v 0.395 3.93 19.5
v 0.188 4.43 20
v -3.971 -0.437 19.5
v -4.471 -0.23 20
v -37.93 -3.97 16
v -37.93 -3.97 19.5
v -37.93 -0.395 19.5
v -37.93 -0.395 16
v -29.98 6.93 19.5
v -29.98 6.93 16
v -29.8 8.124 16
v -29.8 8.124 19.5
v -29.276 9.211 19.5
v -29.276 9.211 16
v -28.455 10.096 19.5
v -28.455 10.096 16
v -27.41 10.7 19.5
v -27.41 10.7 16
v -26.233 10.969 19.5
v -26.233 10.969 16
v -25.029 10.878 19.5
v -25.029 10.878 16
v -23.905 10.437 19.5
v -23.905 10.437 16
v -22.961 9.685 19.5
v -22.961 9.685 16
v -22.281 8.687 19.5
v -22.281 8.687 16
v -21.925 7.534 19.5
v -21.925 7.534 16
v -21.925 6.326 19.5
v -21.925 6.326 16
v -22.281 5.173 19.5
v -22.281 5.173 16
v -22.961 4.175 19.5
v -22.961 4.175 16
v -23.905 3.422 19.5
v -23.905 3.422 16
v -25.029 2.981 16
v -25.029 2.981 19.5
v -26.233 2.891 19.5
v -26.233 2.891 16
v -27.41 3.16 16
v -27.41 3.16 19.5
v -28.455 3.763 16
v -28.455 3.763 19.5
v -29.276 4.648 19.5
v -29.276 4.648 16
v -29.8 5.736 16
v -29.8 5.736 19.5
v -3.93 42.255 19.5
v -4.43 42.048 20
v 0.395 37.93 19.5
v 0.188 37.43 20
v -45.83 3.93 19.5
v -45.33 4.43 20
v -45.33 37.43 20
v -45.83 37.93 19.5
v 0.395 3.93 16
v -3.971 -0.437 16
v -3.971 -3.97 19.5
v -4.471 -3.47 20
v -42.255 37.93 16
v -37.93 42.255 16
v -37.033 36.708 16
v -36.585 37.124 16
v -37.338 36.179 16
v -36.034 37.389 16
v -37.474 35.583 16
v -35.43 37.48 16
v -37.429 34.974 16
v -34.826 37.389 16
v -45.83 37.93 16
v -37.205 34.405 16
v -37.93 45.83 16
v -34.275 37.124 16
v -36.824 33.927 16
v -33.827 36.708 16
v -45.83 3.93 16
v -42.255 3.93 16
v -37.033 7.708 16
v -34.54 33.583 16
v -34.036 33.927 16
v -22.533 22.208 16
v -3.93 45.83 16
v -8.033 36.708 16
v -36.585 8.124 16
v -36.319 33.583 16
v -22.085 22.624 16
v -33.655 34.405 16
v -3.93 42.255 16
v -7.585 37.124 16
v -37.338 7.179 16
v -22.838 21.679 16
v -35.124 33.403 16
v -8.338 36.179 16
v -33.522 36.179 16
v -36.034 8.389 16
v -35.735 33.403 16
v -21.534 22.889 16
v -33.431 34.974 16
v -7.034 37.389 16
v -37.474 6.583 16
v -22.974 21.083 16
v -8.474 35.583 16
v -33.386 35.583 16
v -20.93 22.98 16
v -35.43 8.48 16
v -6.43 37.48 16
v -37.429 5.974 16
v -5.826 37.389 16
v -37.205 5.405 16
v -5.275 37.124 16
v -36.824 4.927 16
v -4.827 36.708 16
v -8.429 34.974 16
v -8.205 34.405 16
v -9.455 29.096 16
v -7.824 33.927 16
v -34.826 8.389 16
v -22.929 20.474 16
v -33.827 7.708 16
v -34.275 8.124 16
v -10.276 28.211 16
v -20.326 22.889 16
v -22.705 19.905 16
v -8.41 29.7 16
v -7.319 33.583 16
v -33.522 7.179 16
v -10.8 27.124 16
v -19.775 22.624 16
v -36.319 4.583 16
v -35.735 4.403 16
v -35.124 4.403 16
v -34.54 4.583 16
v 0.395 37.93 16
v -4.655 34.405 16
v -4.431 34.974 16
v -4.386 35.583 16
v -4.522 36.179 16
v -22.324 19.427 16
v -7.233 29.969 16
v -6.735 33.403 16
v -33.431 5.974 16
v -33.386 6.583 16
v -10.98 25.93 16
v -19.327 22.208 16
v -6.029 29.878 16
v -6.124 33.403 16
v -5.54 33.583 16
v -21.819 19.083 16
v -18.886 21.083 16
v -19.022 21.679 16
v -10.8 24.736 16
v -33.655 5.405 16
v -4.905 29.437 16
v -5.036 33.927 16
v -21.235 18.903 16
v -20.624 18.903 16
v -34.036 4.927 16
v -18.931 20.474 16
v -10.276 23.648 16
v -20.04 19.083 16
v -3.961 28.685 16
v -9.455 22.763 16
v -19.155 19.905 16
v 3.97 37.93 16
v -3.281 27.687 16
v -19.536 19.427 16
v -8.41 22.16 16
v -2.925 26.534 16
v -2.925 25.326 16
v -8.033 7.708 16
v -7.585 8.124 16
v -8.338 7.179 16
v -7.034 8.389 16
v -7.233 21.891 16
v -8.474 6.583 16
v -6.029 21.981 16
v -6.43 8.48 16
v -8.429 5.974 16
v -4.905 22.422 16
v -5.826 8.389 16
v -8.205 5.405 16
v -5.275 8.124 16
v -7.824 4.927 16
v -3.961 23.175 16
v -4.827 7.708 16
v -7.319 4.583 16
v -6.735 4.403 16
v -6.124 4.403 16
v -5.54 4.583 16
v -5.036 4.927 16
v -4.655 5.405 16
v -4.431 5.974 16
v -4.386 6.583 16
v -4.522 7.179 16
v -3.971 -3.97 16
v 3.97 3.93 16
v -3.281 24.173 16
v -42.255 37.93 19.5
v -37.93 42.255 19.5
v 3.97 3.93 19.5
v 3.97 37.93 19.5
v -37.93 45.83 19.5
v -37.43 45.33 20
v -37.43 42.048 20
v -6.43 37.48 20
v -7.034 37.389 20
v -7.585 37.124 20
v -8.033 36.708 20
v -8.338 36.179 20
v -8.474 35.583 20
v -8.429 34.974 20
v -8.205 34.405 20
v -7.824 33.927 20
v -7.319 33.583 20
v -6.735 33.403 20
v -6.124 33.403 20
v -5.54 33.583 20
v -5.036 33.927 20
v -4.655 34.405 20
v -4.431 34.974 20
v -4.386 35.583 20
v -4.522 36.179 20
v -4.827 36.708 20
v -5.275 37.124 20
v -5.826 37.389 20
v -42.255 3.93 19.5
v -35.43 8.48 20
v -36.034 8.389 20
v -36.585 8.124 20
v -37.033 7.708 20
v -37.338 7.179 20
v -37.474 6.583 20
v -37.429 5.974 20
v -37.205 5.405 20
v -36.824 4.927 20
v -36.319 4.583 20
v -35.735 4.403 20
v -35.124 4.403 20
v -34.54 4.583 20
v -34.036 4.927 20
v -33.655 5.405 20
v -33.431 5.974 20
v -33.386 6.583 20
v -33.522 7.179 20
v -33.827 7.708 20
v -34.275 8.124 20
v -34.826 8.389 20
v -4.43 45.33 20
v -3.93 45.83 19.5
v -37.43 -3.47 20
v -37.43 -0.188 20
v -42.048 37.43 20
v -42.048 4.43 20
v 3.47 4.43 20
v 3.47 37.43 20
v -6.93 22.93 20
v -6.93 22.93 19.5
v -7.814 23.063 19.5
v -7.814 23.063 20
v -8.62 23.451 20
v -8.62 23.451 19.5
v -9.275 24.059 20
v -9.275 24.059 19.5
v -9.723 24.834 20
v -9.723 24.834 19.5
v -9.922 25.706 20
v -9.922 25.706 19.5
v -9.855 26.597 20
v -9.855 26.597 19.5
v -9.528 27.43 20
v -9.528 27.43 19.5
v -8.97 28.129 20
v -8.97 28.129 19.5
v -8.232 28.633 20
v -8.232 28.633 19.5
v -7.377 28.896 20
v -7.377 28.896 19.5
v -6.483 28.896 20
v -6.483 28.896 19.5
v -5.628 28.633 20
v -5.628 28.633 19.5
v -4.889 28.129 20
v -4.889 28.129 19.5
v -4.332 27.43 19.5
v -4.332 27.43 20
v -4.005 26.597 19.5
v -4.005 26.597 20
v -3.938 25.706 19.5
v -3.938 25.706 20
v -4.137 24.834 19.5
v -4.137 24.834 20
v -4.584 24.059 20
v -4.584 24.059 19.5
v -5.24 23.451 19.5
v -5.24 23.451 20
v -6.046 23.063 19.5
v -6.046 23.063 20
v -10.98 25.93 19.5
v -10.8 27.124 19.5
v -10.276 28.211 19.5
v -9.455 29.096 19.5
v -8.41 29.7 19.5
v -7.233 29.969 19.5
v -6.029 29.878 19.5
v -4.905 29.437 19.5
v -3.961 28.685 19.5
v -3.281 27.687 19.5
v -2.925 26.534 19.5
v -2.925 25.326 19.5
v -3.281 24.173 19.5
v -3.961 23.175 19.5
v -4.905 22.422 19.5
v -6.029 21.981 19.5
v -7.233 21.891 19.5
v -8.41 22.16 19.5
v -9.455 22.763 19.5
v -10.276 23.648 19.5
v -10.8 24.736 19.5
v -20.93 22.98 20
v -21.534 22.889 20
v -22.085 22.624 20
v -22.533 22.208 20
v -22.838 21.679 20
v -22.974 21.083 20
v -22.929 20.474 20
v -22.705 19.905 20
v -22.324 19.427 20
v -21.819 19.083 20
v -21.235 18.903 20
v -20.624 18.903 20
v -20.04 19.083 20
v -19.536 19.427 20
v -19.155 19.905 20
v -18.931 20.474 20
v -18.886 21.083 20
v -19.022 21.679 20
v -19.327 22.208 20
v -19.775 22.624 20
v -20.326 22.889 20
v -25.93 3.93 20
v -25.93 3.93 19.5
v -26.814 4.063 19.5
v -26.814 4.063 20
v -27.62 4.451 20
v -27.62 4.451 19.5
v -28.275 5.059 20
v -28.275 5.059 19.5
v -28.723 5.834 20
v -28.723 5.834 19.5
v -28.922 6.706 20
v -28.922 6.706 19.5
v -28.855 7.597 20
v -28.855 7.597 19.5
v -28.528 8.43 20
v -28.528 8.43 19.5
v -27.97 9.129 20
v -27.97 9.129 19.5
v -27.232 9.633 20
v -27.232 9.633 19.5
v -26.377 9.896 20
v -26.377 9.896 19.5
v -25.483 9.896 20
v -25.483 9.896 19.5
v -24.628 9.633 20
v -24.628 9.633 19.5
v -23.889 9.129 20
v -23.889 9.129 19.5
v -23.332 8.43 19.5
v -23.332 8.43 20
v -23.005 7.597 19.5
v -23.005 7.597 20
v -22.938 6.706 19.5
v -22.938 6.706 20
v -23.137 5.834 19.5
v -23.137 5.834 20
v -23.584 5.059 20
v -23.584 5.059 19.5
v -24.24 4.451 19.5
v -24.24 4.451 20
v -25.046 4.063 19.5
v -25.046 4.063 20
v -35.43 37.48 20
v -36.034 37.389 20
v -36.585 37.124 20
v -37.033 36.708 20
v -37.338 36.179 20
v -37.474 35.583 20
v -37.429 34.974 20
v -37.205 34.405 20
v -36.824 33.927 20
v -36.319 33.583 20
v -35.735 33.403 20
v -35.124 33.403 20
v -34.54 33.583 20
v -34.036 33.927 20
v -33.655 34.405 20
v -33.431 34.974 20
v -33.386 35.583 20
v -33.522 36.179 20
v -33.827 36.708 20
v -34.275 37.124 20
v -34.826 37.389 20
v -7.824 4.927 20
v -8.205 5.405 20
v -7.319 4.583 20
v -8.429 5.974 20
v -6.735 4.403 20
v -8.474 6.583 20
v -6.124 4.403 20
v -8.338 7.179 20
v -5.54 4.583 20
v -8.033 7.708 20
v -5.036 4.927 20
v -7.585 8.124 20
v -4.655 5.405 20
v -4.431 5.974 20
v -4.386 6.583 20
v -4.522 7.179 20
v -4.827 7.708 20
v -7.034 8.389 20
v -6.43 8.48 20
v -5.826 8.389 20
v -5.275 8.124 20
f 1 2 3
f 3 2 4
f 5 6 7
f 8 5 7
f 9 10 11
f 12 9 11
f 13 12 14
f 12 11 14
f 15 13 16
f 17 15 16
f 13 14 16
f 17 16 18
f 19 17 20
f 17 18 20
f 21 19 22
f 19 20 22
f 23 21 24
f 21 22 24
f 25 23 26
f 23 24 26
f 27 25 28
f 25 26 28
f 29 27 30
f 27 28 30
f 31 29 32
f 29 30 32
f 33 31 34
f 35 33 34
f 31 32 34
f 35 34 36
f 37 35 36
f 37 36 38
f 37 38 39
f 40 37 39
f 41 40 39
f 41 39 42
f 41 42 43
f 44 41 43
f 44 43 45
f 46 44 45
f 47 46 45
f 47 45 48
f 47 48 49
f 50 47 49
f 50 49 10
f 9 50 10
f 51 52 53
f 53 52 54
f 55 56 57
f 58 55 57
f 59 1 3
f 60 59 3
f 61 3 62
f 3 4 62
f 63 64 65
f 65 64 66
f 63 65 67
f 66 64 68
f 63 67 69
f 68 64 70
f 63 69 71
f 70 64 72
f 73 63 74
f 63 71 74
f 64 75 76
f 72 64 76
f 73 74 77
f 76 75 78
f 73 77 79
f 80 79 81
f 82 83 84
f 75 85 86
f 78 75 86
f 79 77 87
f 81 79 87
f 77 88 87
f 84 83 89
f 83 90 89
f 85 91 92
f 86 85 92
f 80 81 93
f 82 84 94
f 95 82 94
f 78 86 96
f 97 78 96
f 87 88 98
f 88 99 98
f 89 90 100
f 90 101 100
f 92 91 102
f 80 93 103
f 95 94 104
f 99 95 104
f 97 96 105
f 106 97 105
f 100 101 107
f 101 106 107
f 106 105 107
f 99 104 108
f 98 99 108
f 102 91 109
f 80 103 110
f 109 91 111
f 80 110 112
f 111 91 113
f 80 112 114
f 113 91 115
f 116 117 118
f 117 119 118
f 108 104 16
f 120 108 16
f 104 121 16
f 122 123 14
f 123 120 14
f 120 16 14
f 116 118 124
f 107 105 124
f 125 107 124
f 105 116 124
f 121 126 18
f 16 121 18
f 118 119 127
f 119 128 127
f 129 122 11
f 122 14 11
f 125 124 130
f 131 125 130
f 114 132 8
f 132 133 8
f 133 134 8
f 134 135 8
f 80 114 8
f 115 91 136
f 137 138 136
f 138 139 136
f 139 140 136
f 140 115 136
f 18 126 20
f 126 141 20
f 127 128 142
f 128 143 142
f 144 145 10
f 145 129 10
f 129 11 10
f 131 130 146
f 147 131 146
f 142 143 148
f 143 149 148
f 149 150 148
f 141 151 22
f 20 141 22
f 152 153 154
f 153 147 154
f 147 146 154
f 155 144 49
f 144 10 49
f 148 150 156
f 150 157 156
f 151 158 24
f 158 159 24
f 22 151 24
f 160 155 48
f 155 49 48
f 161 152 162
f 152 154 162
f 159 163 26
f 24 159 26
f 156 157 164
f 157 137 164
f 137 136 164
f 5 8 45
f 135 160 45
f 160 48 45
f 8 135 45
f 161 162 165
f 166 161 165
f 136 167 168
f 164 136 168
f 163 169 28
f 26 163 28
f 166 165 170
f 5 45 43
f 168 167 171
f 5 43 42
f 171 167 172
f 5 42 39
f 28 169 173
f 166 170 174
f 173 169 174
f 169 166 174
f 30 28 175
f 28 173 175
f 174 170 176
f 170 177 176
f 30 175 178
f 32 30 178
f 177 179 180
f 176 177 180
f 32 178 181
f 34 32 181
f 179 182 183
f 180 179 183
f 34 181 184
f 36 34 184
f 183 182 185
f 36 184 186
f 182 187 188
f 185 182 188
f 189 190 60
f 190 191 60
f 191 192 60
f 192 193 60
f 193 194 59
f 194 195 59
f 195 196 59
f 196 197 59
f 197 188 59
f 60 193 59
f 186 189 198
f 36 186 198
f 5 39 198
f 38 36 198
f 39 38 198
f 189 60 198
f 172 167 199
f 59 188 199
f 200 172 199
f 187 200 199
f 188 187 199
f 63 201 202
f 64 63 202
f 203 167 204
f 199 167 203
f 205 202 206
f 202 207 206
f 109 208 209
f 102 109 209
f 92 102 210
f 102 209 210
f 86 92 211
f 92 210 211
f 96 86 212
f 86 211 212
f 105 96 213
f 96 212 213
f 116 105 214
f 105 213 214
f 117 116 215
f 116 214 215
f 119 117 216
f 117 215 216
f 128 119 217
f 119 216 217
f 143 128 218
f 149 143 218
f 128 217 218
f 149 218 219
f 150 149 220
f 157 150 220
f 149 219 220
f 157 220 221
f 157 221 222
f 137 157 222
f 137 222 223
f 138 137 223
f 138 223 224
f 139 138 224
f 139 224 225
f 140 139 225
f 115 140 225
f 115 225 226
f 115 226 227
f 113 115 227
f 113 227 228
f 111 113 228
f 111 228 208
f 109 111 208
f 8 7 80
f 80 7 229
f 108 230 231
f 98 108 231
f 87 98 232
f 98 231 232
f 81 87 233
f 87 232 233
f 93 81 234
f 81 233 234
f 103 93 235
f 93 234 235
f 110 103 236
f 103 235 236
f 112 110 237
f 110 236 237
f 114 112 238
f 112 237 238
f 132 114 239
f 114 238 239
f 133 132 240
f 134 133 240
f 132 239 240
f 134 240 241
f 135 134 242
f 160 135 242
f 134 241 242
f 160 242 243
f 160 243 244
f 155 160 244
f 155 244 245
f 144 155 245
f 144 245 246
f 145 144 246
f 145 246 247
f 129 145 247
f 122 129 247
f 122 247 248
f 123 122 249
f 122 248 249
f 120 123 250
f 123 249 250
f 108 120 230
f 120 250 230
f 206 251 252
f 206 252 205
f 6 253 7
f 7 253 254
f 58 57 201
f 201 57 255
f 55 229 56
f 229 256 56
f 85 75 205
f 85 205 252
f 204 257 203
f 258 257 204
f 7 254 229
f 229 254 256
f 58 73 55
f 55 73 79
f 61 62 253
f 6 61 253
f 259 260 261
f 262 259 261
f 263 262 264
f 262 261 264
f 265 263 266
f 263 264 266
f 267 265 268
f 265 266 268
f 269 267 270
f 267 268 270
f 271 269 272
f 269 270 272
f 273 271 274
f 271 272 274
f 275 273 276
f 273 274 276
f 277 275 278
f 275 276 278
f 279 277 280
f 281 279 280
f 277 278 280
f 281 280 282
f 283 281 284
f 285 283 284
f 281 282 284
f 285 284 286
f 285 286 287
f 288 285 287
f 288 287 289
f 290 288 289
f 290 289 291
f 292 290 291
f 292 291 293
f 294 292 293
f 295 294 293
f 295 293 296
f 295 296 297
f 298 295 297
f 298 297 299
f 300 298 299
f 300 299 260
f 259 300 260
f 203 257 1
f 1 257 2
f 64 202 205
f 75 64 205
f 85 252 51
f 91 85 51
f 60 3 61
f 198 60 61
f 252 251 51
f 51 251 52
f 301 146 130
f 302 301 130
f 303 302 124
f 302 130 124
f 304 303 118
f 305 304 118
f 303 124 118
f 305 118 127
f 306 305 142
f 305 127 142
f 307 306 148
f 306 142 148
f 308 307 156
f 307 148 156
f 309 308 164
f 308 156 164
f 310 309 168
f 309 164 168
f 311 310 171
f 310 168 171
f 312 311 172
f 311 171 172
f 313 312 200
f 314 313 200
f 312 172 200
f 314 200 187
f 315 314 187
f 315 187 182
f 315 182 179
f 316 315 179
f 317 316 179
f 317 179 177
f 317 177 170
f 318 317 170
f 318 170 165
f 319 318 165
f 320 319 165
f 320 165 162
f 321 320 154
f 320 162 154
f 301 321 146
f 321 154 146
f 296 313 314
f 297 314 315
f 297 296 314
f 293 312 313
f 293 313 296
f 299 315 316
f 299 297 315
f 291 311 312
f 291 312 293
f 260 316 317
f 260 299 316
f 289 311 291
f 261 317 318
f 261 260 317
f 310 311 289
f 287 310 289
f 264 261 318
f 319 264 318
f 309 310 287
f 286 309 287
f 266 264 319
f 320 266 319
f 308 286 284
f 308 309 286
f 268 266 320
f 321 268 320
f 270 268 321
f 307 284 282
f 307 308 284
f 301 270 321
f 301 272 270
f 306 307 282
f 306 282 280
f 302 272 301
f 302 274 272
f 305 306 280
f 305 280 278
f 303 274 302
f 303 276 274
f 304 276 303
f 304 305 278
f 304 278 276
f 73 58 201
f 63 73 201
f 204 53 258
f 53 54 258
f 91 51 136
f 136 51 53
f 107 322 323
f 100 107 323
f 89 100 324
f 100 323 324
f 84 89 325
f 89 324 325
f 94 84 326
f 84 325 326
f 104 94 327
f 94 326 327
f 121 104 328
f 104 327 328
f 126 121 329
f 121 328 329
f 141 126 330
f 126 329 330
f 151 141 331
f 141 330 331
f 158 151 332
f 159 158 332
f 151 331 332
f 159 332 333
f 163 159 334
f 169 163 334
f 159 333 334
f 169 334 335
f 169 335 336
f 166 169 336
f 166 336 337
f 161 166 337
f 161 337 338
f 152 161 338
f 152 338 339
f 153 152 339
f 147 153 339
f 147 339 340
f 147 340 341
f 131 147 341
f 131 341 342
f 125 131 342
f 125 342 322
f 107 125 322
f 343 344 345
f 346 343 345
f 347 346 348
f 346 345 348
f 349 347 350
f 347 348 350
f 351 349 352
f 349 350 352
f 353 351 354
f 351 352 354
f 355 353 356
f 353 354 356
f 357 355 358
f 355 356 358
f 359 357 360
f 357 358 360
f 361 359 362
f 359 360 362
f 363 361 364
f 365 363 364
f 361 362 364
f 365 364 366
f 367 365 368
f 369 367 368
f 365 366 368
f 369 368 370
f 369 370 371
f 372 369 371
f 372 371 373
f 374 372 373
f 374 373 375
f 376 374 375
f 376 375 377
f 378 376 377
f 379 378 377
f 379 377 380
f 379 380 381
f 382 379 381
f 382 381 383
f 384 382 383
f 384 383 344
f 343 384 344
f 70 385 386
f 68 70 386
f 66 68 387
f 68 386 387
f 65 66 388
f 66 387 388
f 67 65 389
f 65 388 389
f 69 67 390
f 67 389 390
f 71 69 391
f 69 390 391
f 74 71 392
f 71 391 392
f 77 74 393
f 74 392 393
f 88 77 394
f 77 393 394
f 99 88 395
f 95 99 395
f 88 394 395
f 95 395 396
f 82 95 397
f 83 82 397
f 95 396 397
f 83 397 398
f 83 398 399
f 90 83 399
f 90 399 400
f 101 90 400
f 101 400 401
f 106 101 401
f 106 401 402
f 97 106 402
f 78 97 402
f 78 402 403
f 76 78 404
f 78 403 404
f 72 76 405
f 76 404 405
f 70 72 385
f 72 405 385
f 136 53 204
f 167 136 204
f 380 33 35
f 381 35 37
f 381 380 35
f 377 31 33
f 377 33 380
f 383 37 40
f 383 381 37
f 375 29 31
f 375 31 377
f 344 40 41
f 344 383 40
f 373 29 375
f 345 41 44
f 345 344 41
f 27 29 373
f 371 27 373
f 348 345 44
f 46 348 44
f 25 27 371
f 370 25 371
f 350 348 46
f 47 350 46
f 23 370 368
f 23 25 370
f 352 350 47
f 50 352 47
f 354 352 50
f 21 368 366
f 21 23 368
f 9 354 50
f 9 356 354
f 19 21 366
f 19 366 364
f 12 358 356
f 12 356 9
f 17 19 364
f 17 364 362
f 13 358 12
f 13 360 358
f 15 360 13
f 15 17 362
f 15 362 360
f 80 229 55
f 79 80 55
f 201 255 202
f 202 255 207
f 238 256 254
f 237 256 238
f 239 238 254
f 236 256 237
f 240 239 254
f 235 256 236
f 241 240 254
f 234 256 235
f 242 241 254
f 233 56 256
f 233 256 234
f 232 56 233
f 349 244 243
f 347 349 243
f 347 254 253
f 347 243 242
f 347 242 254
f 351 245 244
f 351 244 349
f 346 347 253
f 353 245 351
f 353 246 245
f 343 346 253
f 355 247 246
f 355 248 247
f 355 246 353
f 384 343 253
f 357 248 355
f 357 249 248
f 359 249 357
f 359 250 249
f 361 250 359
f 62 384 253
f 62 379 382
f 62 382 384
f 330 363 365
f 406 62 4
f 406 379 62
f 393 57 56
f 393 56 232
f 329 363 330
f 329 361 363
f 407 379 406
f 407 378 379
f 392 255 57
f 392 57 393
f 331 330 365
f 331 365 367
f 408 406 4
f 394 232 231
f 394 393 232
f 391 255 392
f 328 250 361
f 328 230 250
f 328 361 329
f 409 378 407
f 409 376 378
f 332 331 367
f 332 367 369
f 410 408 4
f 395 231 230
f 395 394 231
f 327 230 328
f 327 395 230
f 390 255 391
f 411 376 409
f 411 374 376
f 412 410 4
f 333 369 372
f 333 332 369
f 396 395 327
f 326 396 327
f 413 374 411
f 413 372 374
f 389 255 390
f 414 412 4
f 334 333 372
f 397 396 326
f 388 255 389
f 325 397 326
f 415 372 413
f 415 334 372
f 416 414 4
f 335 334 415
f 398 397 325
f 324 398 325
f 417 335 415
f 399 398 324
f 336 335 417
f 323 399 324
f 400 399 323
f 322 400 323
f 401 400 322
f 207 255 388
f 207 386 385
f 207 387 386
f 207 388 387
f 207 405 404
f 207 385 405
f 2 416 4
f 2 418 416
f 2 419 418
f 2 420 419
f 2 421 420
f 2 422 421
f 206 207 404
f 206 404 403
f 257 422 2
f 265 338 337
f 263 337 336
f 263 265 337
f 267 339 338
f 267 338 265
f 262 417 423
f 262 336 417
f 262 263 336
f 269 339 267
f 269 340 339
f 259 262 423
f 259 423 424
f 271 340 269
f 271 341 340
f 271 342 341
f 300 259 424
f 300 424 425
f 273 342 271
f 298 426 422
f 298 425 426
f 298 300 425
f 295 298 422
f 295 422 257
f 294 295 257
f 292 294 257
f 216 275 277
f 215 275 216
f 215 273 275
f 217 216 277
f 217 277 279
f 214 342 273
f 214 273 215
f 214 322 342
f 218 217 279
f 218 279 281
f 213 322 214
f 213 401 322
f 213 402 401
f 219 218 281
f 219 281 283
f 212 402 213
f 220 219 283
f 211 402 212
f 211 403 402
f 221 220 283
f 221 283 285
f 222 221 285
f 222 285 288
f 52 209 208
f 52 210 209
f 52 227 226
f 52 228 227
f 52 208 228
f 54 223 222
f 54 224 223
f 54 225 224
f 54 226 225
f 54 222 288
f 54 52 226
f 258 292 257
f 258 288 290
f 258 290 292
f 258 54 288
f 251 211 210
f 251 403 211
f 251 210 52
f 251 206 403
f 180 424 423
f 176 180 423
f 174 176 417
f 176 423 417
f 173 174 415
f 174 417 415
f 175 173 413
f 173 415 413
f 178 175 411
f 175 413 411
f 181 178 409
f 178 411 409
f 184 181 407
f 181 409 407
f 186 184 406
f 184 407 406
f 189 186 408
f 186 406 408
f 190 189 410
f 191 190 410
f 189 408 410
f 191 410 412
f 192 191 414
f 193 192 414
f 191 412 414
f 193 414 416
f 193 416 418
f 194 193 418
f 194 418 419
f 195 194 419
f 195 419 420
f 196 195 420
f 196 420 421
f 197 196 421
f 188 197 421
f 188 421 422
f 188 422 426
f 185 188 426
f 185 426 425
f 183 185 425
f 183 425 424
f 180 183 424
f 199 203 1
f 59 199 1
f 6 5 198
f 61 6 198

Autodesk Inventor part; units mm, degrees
ref_plane "YZ Plane" through (0, 0, 0) normal (1, 0, 0) x (0, 1, 0)
ref_plane "XZ Plane" through (0, 0, 0) normal (0, 1, 0) x (-1, 0, 0)
ref_plane "Work Plane1" through (0, 0, 10) normal (0, 0, 1) x (1, 0, 0)
sketch "Sketch1" plane through (0, 0, 10) normal (0, 0, 1) x (1, 0, 0)
  line L0 (-4.0299, -0.3538) -> (-2.2322, 1.4439) construction
  arc A0 (-1.4439, 2.2322) -> (-2.2322, 1.4439) centre (-0.9299, 0.9299) ccw construction
  line L1 (-1.4439, 2.2322) -> (0.3538, 4.0299) construction
  line L2 (-37.8299, 42.8299) -> (-37.8299, 37.8299) construction
  line L3 (-37.8299, 37.8299) -> (-42.9208, 37.8299) construction
  line L4 (-37.8299, 42.2137) -> (-37.8299, 45.8299) construction
  line L5 (-37.8299, 45.8299) -> (-4.0299, 45.8299) construction
  line L6 (-4.0299, 45.8299) -> (-4.0299, 42.2137) construction
  line L7 (-4.0299, 4.0299) -> (0.3538, 4.0299) projected
  circle A1 centre (-20.9299, 20.9299) radius 17.5 projected
  line L8 (-20.9299, 58.9723) -> (17.1124, 20.9299) construction
  line L9 (17.1124, 20.9299) -> (-20.9299, -17.1124) construction
  line L10 (-20.9299, -17.1124) -> (-58.9723, 20.9299) construction
  line L11 (-58.9723, 20.9299) -> (-20.9299, 58.9723) construction
  line L12 (-20.9299, 58.9723) -> (-20.9299, -17.1124) construction
  line L13 (17.1124, 20.9299) -> (-58.9723, 20.9299) construction
  line L14 (-20.9299, 58.9723) -> (32.8701, 58.9723) construction
  line L15 (-43.4299, 43.4299) -> (1.5701, 43.4299) construction
  line L16 (1.5701, 43.4299) -> (1.5701, -1.5701) construction
  line L17 (1.5701, -1.5701) -> (-43.4299, -1.5701) construction
  line L18 (-43.4299, -1.5701) -> (-43.4299, 43.4299) construction
  line L19 (-43.4299, 43.4299) -> (1.5701, -1.5701) construction
  line L20 (1.5701, 43.4299) -> (-43.4299, -1.5701) construction
  line L21 (-43.4299, 5.3876) -> (-43.4299, 36.4723)
  line L22 (-43.4299, 36.4723) -> (-36.4723, 43.4299)
  line L23 (-36.4723, 43.4299) -> (-5.3876, 43.4299)
  line L24 (-5.3876, 43.4299) -> (1.5701, 36.4723)
  line L25 (1.5701, 36.4723) -> (1.5701, 5.3876)
  line L26 (1.5701, 5.3876) -> (-5.3876, -1.5701)
  line L27 (-5.3876, -1.5701) -> (-36.4723, -1.5701)
  line L28 (-36.4723, -1.5701) -> (-43.4299, 5.3876)
  line L29 (-4.0299, 42.2137) -> (-37.8299, 42.2137) projected
  line L30 (-4.0299, -0.3538) -> (-4.0299, 4.0299) projected
  circle A2 centre (-20.9299, 20.9299) radius 1.5
  line L31 (-10.9299, 10.9299) -> (-30.9299, 10.9299) construction
  line L32 (-30.9299, 10.9299) -> (-30.9299, 30.9299) construction
  line L33 (-30.9299, 30.9299) -> (-10.9299, 30.9299) construction
  line L34 (-10.9299, 30.9299) -> (-10.9299, 10.9299) construction
  line L35 (-10.9299, 10.9299) -> (-30.9299, 30.9299) construction
  line L36 (-30.9299, 10.9299) -> (-10.9299, 30.9299) construction
  circle A3 centre (-30.9299, 30.9299) radius 1.4
  circle A4 centre (-30.9299, 10.9299) radius 1.4
  circle A5 centre (-10.9299, 10.9299) radius 1.4
  line L37 (-45.8299, 37.8299) -> (-42.0723, 37.8299) construction
  line L38 (-42.1723, 37.7299) -> (-45.8299, 37.7299)
  line L39 (-45.8299, 37.7299) -> (-45.8299, 4.1299)
  line L40 (-45.8299, 4.1299) -> (-42.1723, 4.1299)
  line L41 (-42.1723, 4.1299) -> (-42.1723, 37.7299)
  line L42 (-45.8299, 4.0299) -> (-42.0723, 4.0299) construction
  line L43 (-45.8299, 37.8299) -> (-42.0723, 37.8299) projected
  line L44 (-37.7299, 45.8299) -> (-4.1299, 45.8299)
  line L45 (-4.1299, 45.8299) -> (-4.1299, 42.1723)
  line L46 (-4.1299, 42.1723) -> (-37.7299, 42.1723)
  line L47 (-37.7299, 42.1723) -> (-37.7299, 45.8299)
  line L48 (0.4701, 37.8299) -> (0.4701, 4.0299) construction
  line L49 (0.4701, 4.0299) -> (3.9701, 4.0299) construction
  line L50 (3.9701, 37.8299) -> (3.9701, 4.0299) construction
  line L51 (0.4701, 37.8299) -> (3.9701, 37.8299) construction
  line L52 (-45.8299, -3.9701) -> (-4.0299, -3.9701) construction
  line L53 (0.3124, 37.7299) -> (3.9701, 37.7299)
  line L54 (3.9701, 37.7299) -> (3.9701, 4.1299)
  line L55 (3.9701, 4.1299) -> (0.3124, 4.1299)
  line L56 (0.3124, 4.1299) -> (0.3124, 37.7299)
  line L57 (-4.1713, -0.3538) -> (-37.7299, -0.3538)
  line L58 (-37.7299, -0.3538) -> (-37.7299, -3.9701)
  line L59 (-37.7299, -3.9701) -> (-4.1713, -3.9701)
  line L60 (-4.1713, -3.9701) -> (-4.1713, -0.3538)
  point P0 (-37.8299, 4.0299)
  dimension "d18" = 53.8
  dimension "d19" = 45
  dimension "d20" = 53.8
  dimension "d21" = 45
  dimension "d22" = 45
  dimension "d30" = 20
  dimension "d31" = 20
  dimension "d32" = 2.8
  dimension "d33" = 2.8
  dimension "d34" = 2.8
  dimension "d35" = 3
  dimension "d36" = 0.1
  dimension "d37" = 0.1
  dimension "d38" = 0.1
  dimension "d39" = 0.1
extrude "Extrusion1" add sketch "Sketch1" along normal blind 10 contours L30 L26 L57 L28 L41 L22 L46 L24 L56 L7 | L7 L26 L30 | L56 L24 L25 L26 | L26 L25 L24 L53 L54 L55 | L60 L59 L58 L57 L28 L27 L26 | L26 L27 L28 L57 | L46 L22 L29 L24 | L24 L29 L45 | L40 L39 L38 L22 L21 L28 | L28 L21 L22 L41 | L29 L22 L23 L24 | L24 L23 L22 L29 L47 L44 L45 | L47 L29 L22 | A1 | A2 | A3 | A4 | A5
sketch "Skizze4" plane through (0, 0, 20) normal (0, 0, 1) x (1, 0, 0)
  line L0 (-37.7299, 42.1723) -> (-42.1723, 37.7299) projected
  line L1 (-42.1723, 37.7299) -> (-45.8299, 37.7299) projected
  line L2 (-45.8299, 37.7299) -> (-45.8299, 4.1299) construction
  line L3 (-45.8299, 4.1299) -> (-42.1723, 4.1299) projected
  line L4 (-42.1723, 4.1299) -> (-37.6885, -0.3538) projected
  line L5 (-37.6885, -0.3538) -> (-37.7299, -0.3538) projected
  line L6 (-37.7299, -0.3538) -> (-37.7299, -3.9701) projected
  line L7 (-37.7299, -3.9701) -> (-4.1713, -3.9701) construction
  line L8 (-4.1713, -3.9701) -> (-4.1713, -0.3538) projected
  line L9 (-4.1713, -0.3538) -> (0.3124, 4.1299) projected
  line L10 (0.3124, 4.1299) -> (3.9701, 4.1299) projected
  line L11 (3.9701, 4.1299) -> (3.9701, 37.7299) construction
  line L12 (3.9701, 37.7299) -> (0.3124, 37.7299) projected
  line L13 (0.3124, 37.7299) -> (-4.1299, 42.1723) projected
  line L14 (-4.1299, 42.1723) -> (-4.1299, 45.8299) projected
  line L15 (-4.1299, 45.8299) -> (-37.7299, 45.8299) construction
  line L16 (-37.7299, 45.8299) -> (-37.7299, 42.1723) projected
  line L17 (-37.9299, 46.0299) -> (-3.9299, 46.0299) construction
  line L18 (-3.9299, 46.0299) -> (-3.9299, 42.2551)
  line L19 (-3.9299, 42.2551) -> (0.3953, 37.9299)
  line L20 (0.3953, 37.9299) -> (4.1701, 37.9299)
  line L21 (4.1701, 37.9299) -> (4.1701, 3.9299) construction
  line L22 (4.1701, 3.9299) -> (0.3953, 3.9299)
  line L23 (0.3953, 3.9299) -> (-3.9713, -0.4367)
  line L24 (-3.9713, -0.4367) -> (-3.9713, -4.1701)
  line L25 (-3.9713, -4.1701) -> (-37.9299, -4.1701) construction
  line L26 (-37.9299, -4.1701) -> (-37.9299, -0.3953)
  line L27 (-37.9299, -0.3953) -> (-42.2551, 3.9299)
  line L28 (-42.2551, 3.9299) -> (-46.0299, 3.9299)
  line L29 (-46.0299, 3.9299) -> (-46.0299, 37.9299) construction
  line L30 (-46.0299, 37.9299) -> (-42.2551, 37.9299)
  line L31 (-42.2551, 37.9299) -> (-37.9299, 42.2551)
  line L32 (-37.9299, 42.2551) -> (-37.9299, 46.0299)
  line L33 (-45.8299, 37.7299) -> (-45.8299, 37.9299)
  line L34 (-4.1299, 45.8299) -> (-37.7299, 45.8299) projected
  line L35 (-37.7299, 45.8299) -> (-37.9299, 45.8299)
  line L36 (-4.1299, 45.8299) -> (-3.9299, 45.8299)
  line L37 (3.9701, 37.7299) -> (3.9701, 37.9299)
  line L38 (3.9701, 4.1299) -> (3.9701, 37.7299) projected
  line L39 (3.9701, 4.1299) -> (3.9701, 3.9299)
  line L40 (-4.1713, -3.9701) -> (-3.9713, -3.9701)
  line L41 (-37.7299, -3.9701) -> (-37.9299, -3.9701)
  line L42 (-45.8299, 4.1299) -> (-45.8299, 3.9299)
  point P0 (0, 0)
  dimension "d40" = 0.2
extrude "IM_offset" add sketch "Skizze4" against normal up to surface (10 mm away)
ref_plane "Work Plane5" through (-37.9299, 20.9299, 10) normal (0, -1, 0) x (1, 0, 0)
ref_plane "Work Plane6" through (-20.9299, 3.9299, 10) normal (1, 0, 0) x (0, 0, -1)
sketch "Sketch24" plane through (0, 0, 10) normal (0, 0, -1) x (-1, 0, 0)
  line L0 (6.4299, 6.4299) -> (35.4299, 6.4299) construction
  line L1 (35.4299, 6.4299) -> (35.4299, 35.4299) construction
  line L2 (35.4299, 35.4299) -> (6.4299, 35.4299) construction
  line L3 (6.4299, 35.4299) -> (6.4299, 6.4299) construction
  line L4 (6.4299, 6.4299) -> (35.4299, 35.4299) construction
  line L5 (35.4299, 6.4299) -> (6.4299, 35.4299) construction
  point P0 (0, 0)
  point P1 (20.9299, 20.9299)
  dimension "d143" = 29
  dimension "d144" = 29
hole "Hole1" at (-20.9299, 20.9299, 10) at (-6.4299, 6.4299, 10) at (-35.4299, 6.4299, 10) at (-35.4299, 35.4299, 10) at (-6.4299, 35.4299, 10) direction (0, 0, 1) diameter 4.1 end through all
sketch "Skizze28" plane through (0, 0, 10) normal (0, 0, -1) x (-1, 0, 0)
  circle A0 centre (25.9299, 6.9299) radius 3 projected
  circle A1 centre (6.9299, 25.9299) radius 3 projected
  line L0 (9.9299, 4.9299) -> (1.9299, 4.9299) projected
  line L1 (4.9299, 1.9299) -> (1.9299, 4.9299) projected
  line L2 (36.9299, 1.9299) -> (4.9299, 1.9299) projected
  line L3 (39.9299, 4.9299) -> (36.9299, 1.9299) projected
  line L4 (39.9299, 36.9299) -> (39.9299, 4.9299) projected
  line L5 (36.9299, 39.9299) -> (39.9299, 36.9299) projected
  line L6 (4.9299, 39.9299) -> (36.9299, 39.9299) projected
  line L7 (1.9299, 36.9299) -> (4.9299, 39.9299) projected
  line L8 (1.9299, 8.9299) -> (1.9299, 36.9299) projected
  line L9 (1.9299, 8.9299) -> (9.9299, 8.9299) projected
  line L10 (9.9299, 8.9299) -> (9.9299, 4.9299) projected
  circle A2 centre (34.9299, 6.9299) radius 2 projected
  circle A3 centre (6.9299, 25.9299) radius 4.05
  circle A4 centre (25.9299, 6.9299) radius 4.05
  point P0 (0, 0)
  dimension "d173" = 8.1
  dimension "d174" = 8.1
extrude "Extrusion23" cut sketch "Skizze28" against normal blind 9.5 contours A0 | A1 | A3 | A4
chamfer "Fase2" distance 0.5 angle 45 27 edges at (-2.8799, 25.9299, 10) (-35.4299, 4.3799, 10) (-6.4299, 4.3799, 10) (-20.9299, 18.8799, 10) (-35.4299, 33.3799, 10) (-6.4299, 33.3799, 10) (-21.8799, 6.9299, 10) (-45.8299, 20.9299, 10) (-20.9506, -3.9701, 10) (3.9701, 20.9299, 20) (3.9701, 20.9299, 10) (-20.9299, 45.8299, 10) (-44.0425, 37.9299, 20) (-40.0925, 40.0925, 20) (-37.9299, 44.0425, 20) (-20.9299, 45.8299, 20) (-45.8299, 20.9299, 20) (-44.0425, 3.9299, 20) (-20.9506, -3.9701, 20) (-37.9299, -2.1827, 20) (-40.0925, 1.7673, 20) (-3.9713, -2.2034, 20) (-1.788, 1.7466, 20) (2.1827, 3.9299, 20) (2.1827, 37.9299, 20) (-1.7673, 40.0925, 20) (-3.9299, 44.0425, 20)
sketch "Skizze29" plane through (0, 0, 20) normal (0, 0, 1) x (1, 0, 0)
  circle A0 centre (-35.4299, 6.4299) radius 2.55 projected
  circle A1 centre (-25.9299, 6.9299) radius 4.55 projected
  circle A2 centre (-20.9299, 20.9299) radius 2.55 projected
  circle A3 centre (-6.9299, 25.9299) radius 4.55 projected
  circle A4 centre (-6.4299, 35.4299) radius 2.55 projected
  circle A5 centre (-6.4299, 6.4299) radius 2.55 projected
  circle A6 centre (-35.4299, 35.4299) radius 2.55 projected
  line L0 (3.4701, 4.4299) -> (3.4701, 37.4299) projected
  line L1 (0.1882, 4.4299) -> (3.4701, 4.4299) projected
  line L2 (-4.4713, -0.2296) -> (0.1882, 4.4299) projected
  line L3 (-4.4713, -3.4701) -> (-4.4713, -0.2296) projected
  line L4 (-37.4299, -3.4701) -> (-4.4713, -3.4701) projected
  line L5 (-37.4299, -0.1882) -> (-37.4299, -3.4701) projected
  line L6 (-42.048, 4.4299) -> (-37.4299, -0.1882) projected
  line L7 (-45.3299, 4.4299) -> (-42.048, 4.4299) projected
  line L8 (-45.3299, 37.4299) -> (-45.3299, 4.4299) projected
  line L9 (-42.048, 37.4299) -> (-45.3299, 37.4299) projected
  line L10 (-37.4299, 42.048) -> (-42.048, 37.4299) projected
  line L11 (-37.4299, 45.3299) -> (-37.4299, 42.048) projected
  line L12 (-4.4299, 45.3299) -> (-37.4299, 45.3299) projected
  line L13 (-4.4299, 42.048) -> (-4.4299, 45.3299) projected
  line L14 (0.1882, 37.4299) -> (-4.4299, 42.048) projected
  line L15 (3.4701, 37.4299) -> (0.1882, 37.4299) projected
  point P0 (0, 0)
hole "Bohrung2" at (-6.9299, 25.9299, 20) at (-25.9299, 6.9299, 20) direction (0, 0, -1) diameter 6 end through all
sketch "Sketch30" plane through (3.9701, 3.9299, 19.5) normal (1, 0, 0) x (0, 0, -1)
  line L0 (9.5, 44.7711) -> (3.5, 44.7711)
  line L1 (3.5, 44.7711) -> (3.5, -17.5234)
  line L2 (3.5, -17.5234) -> (9.5, -17.5234)
  line L3 (9.5, -17.5234) -> (9.5, 44.7711)
  line L4 (9.5, 0.5) -> (9.5, 33.5) projected
  point P0 (19.5, -3.9299)
  dimension "d187" = 6
extrude "Extrusion24" cut sketch "Sketch30" against normal through all
properties part number "20_Cube_Insert_Kinematic_Mirror_90_pro_magnetic"
